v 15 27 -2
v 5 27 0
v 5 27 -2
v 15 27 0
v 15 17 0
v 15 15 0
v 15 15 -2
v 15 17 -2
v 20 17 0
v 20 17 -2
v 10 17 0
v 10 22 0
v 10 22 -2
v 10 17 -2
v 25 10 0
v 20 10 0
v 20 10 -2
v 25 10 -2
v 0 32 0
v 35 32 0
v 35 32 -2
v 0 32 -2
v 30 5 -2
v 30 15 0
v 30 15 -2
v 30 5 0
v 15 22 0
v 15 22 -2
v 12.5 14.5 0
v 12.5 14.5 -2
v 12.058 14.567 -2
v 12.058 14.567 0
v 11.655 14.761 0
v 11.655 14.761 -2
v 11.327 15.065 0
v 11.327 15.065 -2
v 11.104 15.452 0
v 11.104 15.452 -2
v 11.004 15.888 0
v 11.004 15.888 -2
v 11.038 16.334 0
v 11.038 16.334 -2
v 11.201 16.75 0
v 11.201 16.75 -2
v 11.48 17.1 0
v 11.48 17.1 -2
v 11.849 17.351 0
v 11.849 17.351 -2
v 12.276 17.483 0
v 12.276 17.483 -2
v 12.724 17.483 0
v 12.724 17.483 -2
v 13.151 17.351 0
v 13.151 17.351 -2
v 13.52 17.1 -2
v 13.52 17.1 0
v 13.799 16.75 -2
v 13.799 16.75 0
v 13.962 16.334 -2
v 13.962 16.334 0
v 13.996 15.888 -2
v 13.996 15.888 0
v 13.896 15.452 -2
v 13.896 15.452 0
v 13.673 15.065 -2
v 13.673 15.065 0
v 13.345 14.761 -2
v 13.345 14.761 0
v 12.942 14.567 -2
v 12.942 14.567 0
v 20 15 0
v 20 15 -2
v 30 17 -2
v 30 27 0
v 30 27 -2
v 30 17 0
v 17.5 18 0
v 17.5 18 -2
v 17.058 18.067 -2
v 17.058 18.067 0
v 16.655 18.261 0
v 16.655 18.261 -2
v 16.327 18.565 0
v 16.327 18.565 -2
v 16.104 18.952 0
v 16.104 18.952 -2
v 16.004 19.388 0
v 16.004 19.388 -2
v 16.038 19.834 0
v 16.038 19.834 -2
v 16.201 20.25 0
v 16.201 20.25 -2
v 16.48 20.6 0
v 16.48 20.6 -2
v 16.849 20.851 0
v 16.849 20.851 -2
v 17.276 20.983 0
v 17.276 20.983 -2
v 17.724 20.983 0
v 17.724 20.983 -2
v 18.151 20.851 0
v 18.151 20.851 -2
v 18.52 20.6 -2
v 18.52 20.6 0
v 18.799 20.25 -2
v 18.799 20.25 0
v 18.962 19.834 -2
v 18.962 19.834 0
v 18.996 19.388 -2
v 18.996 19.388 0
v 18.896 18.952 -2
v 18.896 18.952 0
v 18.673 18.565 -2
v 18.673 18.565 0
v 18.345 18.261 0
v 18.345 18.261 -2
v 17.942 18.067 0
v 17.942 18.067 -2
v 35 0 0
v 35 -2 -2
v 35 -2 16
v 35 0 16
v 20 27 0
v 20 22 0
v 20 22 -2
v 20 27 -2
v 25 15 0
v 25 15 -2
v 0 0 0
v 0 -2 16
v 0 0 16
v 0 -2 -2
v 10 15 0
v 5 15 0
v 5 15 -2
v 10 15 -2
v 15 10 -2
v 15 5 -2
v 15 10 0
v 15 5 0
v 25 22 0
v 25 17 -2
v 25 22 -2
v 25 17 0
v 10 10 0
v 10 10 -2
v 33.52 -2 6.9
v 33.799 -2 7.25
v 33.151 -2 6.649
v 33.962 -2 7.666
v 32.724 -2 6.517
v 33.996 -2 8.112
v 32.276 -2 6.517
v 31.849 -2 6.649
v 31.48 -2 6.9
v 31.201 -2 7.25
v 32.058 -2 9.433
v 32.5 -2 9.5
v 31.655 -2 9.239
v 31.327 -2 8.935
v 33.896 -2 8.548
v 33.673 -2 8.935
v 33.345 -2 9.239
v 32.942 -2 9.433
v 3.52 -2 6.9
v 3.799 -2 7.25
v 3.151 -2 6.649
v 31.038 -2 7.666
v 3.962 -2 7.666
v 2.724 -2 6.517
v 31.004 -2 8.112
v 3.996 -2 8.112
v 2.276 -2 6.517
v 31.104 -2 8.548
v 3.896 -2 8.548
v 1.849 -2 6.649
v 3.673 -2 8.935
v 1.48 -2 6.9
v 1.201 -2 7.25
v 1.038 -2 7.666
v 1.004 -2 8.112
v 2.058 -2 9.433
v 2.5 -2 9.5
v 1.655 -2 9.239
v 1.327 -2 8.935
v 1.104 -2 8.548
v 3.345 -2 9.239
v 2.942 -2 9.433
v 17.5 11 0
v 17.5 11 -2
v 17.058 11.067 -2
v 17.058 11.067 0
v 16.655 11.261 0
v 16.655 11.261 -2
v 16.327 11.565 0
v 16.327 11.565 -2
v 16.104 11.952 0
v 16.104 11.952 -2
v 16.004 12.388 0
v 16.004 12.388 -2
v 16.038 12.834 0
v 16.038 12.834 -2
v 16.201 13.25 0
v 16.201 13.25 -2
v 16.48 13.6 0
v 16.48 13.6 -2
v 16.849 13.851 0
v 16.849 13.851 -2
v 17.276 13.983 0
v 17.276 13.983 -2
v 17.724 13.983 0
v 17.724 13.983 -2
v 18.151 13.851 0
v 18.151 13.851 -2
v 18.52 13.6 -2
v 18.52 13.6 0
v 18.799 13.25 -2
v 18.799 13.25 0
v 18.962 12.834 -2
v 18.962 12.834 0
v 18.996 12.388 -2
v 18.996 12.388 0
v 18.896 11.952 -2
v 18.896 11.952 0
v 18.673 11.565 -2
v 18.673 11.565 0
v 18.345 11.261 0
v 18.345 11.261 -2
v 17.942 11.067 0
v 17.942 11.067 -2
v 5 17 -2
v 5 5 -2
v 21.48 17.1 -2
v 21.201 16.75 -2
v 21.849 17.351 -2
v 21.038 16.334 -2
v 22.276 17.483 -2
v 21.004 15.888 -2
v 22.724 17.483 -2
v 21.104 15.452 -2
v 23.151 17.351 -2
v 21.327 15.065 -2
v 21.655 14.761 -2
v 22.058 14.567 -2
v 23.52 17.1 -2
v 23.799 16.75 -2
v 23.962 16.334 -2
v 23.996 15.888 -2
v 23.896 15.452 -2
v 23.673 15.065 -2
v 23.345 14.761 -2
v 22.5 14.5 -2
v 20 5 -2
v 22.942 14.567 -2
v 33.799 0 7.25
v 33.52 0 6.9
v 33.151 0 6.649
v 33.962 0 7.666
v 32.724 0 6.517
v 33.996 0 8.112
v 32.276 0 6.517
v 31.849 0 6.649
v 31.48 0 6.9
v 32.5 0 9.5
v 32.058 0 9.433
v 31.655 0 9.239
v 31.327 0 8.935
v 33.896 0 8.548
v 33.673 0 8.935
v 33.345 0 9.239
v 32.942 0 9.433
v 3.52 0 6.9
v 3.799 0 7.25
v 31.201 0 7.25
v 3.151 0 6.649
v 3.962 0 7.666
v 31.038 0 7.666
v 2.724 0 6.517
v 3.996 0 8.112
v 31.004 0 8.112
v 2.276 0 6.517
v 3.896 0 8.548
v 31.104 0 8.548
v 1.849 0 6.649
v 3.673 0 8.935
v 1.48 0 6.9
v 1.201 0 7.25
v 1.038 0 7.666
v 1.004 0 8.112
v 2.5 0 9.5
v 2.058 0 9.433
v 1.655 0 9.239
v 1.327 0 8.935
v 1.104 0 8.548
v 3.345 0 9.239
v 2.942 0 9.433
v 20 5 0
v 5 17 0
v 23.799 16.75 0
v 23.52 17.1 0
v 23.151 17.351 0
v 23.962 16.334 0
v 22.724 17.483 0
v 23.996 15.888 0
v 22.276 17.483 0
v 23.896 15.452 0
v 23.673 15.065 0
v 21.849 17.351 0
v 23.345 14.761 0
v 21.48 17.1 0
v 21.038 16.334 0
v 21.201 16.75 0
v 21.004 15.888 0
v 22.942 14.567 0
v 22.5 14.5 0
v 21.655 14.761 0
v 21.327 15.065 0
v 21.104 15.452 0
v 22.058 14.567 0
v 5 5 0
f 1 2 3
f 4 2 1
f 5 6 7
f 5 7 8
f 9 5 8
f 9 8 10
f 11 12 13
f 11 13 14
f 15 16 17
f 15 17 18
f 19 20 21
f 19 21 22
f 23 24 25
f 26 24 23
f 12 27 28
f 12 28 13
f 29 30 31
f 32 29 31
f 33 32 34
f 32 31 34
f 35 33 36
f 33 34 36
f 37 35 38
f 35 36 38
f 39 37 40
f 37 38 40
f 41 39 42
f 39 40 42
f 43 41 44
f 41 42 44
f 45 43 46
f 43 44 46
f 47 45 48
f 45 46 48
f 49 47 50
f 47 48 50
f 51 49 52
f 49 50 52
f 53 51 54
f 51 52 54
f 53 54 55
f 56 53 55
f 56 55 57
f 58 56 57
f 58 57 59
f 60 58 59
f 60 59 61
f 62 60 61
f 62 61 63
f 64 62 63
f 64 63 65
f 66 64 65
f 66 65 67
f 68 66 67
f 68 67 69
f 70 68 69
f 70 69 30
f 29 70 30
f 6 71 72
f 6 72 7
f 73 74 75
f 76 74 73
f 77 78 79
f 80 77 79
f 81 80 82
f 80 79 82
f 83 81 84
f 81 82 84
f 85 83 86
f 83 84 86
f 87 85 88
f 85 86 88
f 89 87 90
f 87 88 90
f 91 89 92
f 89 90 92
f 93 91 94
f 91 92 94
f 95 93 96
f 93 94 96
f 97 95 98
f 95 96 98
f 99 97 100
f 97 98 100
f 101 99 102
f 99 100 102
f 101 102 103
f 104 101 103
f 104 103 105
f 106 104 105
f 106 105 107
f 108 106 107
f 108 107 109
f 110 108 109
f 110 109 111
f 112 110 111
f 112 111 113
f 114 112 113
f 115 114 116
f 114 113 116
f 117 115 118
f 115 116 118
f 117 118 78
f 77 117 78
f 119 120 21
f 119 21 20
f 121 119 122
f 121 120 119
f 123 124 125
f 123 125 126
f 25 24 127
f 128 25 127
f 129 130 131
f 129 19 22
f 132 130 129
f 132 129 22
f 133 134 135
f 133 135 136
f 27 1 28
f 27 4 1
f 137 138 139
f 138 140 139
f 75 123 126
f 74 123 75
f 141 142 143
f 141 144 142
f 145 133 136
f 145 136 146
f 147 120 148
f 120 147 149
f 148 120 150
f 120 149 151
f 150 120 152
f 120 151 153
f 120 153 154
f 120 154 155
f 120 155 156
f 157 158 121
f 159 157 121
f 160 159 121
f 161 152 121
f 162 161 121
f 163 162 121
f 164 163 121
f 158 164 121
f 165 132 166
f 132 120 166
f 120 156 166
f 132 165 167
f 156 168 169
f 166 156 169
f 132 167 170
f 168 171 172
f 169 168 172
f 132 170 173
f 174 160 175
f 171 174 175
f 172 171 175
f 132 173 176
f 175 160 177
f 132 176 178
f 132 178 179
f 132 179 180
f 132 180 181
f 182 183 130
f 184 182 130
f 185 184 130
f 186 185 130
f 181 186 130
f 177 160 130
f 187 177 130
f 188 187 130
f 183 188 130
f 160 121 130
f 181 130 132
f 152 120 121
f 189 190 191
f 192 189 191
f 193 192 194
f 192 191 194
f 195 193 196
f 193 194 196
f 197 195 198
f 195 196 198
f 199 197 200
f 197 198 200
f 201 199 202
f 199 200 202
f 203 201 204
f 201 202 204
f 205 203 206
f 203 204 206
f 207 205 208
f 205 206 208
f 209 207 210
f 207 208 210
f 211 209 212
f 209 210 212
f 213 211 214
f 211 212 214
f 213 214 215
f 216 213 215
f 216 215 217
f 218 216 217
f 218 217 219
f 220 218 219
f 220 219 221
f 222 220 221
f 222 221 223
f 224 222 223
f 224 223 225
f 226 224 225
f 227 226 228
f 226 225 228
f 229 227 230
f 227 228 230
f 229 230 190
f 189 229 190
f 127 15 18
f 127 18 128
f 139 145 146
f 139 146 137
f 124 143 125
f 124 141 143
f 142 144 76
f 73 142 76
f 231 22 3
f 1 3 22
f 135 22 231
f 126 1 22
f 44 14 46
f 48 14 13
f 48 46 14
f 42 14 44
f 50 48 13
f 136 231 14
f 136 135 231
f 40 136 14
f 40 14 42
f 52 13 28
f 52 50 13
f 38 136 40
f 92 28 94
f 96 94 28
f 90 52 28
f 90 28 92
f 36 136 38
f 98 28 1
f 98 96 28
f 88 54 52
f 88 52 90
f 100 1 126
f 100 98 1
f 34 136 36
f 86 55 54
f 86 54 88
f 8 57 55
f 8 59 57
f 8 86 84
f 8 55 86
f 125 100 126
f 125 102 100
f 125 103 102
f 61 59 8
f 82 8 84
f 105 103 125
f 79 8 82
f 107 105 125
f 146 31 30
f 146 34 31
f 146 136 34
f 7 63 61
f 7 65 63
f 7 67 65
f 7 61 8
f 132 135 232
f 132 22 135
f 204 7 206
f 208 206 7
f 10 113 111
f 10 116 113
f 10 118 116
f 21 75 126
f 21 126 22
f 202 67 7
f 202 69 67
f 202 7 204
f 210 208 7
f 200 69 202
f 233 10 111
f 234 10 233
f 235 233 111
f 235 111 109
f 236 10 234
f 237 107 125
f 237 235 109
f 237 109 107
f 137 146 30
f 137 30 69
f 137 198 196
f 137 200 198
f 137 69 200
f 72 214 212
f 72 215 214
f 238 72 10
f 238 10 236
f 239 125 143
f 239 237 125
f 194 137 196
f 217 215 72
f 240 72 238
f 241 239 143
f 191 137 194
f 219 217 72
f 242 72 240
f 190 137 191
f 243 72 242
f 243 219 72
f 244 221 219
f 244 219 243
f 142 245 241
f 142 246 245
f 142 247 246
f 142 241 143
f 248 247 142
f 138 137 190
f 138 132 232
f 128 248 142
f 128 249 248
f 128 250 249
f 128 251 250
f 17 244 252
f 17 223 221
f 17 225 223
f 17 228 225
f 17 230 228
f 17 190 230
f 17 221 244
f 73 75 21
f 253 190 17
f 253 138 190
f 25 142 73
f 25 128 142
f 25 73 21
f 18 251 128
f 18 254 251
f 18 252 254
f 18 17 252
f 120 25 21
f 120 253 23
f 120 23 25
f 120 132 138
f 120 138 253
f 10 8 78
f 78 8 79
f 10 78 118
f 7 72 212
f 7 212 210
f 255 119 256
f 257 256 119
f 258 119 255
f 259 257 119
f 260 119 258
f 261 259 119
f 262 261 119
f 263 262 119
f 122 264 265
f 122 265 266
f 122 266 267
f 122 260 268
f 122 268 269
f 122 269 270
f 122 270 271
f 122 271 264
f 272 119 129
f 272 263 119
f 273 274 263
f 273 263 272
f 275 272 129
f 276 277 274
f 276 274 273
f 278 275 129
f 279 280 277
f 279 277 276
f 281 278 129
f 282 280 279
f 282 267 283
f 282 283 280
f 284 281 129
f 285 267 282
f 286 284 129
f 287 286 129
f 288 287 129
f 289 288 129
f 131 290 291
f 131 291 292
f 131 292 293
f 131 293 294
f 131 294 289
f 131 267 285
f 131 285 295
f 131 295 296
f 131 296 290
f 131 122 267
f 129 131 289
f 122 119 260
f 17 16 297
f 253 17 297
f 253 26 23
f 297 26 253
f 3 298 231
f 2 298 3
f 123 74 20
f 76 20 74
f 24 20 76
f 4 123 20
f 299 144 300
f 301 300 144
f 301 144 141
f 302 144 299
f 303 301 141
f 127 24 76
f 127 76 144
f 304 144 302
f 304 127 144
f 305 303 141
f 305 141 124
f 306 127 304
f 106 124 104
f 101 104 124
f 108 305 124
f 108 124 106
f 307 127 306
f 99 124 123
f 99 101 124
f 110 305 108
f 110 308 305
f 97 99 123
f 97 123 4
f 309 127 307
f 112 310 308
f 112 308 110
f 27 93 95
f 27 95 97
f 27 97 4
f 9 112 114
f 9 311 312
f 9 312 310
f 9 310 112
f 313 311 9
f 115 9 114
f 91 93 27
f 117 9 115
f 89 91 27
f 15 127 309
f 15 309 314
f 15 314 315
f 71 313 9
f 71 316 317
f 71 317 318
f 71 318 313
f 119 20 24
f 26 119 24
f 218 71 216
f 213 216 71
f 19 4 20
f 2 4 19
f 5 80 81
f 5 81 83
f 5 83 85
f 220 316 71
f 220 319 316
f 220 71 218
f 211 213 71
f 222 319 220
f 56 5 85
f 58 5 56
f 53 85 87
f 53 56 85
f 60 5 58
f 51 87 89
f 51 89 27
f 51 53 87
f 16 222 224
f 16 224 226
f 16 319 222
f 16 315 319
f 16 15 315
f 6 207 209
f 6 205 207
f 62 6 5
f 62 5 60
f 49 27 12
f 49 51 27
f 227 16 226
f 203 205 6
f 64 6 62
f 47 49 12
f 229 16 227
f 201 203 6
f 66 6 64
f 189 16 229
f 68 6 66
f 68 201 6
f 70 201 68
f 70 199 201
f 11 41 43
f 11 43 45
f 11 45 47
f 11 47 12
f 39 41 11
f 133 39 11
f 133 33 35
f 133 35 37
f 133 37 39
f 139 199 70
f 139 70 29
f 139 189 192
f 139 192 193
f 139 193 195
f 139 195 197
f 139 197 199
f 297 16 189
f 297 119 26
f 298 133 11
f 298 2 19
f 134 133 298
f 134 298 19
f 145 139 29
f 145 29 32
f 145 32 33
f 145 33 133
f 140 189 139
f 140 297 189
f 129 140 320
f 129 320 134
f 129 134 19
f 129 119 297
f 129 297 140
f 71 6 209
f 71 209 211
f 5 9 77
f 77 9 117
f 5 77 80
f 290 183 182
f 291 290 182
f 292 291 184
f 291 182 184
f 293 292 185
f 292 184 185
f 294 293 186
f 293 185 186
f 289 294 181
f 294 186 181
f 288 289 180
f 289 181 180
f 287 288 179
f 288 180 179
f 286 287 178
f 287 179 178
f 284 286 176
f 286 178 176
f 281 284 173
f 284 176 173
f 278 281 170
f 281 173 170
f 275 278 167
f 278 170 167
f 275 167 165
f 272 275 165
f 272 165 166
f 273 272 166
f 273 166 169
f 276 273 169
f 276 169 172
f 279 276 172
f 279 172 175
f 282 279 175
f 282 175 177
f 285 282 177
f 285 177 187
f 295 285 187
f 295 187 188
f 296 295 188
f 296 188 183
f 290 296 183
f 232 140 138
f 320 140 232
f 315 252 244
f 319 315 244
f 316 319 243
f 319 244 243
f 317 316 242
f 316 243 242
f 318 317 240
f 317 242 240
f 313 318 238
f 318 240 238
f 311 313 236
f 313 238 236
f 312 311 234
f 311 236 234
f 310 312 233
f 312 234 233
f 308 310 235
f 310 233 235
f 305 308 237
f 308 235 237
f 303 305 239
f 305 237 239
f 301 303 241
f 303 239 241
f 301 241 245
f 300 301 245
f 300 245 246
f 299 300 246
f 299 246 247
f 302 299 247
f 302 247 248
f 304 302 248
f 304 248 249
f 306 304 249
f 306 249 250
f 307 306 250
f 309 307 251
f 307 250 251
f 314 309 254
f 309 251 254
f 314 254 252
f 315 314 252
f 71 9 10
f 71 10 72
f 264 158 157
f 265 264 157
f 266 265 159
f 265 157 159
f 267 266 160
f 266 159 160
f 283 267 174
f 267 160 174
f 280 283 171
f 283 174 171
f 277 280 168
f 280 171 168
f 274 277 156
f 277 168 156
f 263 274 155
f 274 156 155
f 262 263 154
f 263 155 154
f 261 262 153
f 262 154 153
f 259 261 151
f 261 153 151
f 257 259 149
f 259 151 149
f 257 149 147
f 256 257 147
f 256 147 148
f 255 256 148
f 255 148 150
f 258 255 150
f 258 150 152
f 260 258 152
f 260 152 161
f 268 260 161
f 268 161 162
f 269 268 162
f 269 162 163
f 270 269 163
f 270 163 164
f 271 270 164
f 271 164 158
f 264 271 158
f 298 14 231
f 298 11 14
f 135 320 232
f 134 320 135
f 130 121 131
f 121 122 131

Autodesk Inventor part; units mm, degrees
ref_plane "YZ Plane" through (0, 0, 0) normal (1, 0, 0) x (0, 1, 0)
ref_plane "XZ Plane" through (0, 0, 0) normal (0, 1, 0) x (-1, 0, 0)
ref_plane "XY Plane" through (0, 0, 0) normal (0, 0, 1) x (1, 0, 0)
sketch "Sketch1" plane through (0, 0, 0) normal (0, 1, 0) x (-1, 0, 0)
  line L0 (-30, 12) -> (-34, 12)
  line L1 (-34, 12) -> (-34, 14)
  line L2 (-34, 14) -> (-30, 14)
  line L3 (-30, 14) -> (-30, 16)
  line L4 (-30, 16) -> (-35, 16)
  line L5 (-35, 16) -> (-35, 0)
  line L6 (-35, 0) -> (-30, 0)
  line L7 (-30, 0) -> (-30, 12)
  line L8 (-1, 12) -> (-5, 12)
  line L9 (-5, 12) -> (-5, 0)
  line L10 (-5, 0) -> (0, 0)
  line L11 (0, 0) -> (0, 16)
  line L12 (0, 16) -> (-5, 16)
  line L13 (-5, 16) -> (-5, 14)
  line L14 (-5, 14) -> (-1, 14)
  line L15 (-1, 14) -> (-1, 12)
  line L16 (-35, 0) -> (0, 0)
  line L17 (0, 0) -> (0, -2)
  line L18 (0, -2) -> (-35, -2)
  line L19 (-35, -2) -> (-35, 0)
  line L20 (-35, 16) -> (0, 16)
  line L21 (0, 16) -> (0, -2)
  line L22 (0, -2) -> (-35, -2)
  line L23 (-35, -2) -> (-35, 16)
  line L24 (-35, 16) -> (-30, 0)
  line L25 (-5, 0) -> (0, 16)
  point P0 (-32.5, 8)
  point P1 (-2.5, 8)
  dimension "d0" = 2
extrude "Extrusion1" add sketch "Sketch1" along normal blind 32 contours L16 L10 L17 L18 L19 L6
extrude "Extrusion2" add sketch "Sketch1" against normal blind 2
hole "Hole1" at (32.5, 0, 8) at (2.5, 0, 8) direction (0, -1, 0) diameter 3 depth 8 tip angle 118
sketch "Sketch2" plane through (0, 32, 0) normal (0, 0, 1) x (1, 0, 0)
  line L0 (0, -32) -> (35, -32) projected
  line L1 (35, -32) -> (35, 0) projected
  line L2 (0, 0) -> (35, 0) projected
  line L3 (0, -32) -> (0, 0) projected
  line L4 (30, -5) -> (30, -27)
  line L5 (30, -27) -> (5, -27)
  line L6 (5, -27) -> (5, -5)
  line L7 (5, -5) -> (30, -5)
  line L8 (25, -22) -> (25, -10)
  line L9 (25, -10) -> (10, -10)
  line L10 (10, -10) -> (10, -22)
  line L11 (10, -22) -> (25, -22)
  line L12 (20, -15) -> (20, -17)
  line L13 (20, -17) -> (15, -17)
  line L14 (15, -17) -> (15, -15)
  line L15 (15, -15) -> (20, -15)
  point P0 (17.5, -5)
  point P1 (17.5, -10)
  point P2 (17.5, -27)
  point P3 (17.5, -22)
  point P4 (17.5, -15)
  point P5 (17.5, -17)
  dimension "d12" = 5
  dimension "d13" = 5
  dimension "d14" = 5
extrude "Extrusion3" cut sketch "Sketch2" against normal blind 10 contours L4 L5 L6 L7 | L12 L13 L14 L15
sketch "Sketch3" plane through (0, 32, 0) normal (0, 0, 1) x (1, 0, 0)
  line L0 (15, -17) -> (15, -15) projected
  line L1 (20, -15) -> (20, -17) projected
  line L2 (20, -17) -> (15, -17) projected
  line L3 (15, -15) -> (20, -15) projected
  line L4 (15, -17) -> (20, -17)
  line L5 (20, -17) -> (20, -28.4521)
  line L6 (20, -28.4521) -> (15, -28.4521)
  line L7 (15, -28.4521) -> (15, -17)
  line L8 (15, -15) -> (5, -15)
  line L9 (5, -15) -> (5, -17)
  line L10 (5, -17) -> (15, -17)
  line L11 (15, -17) -> (15, -15)
  line L12 (15, -15) -> (20, -15)
  line L13 (20, -15) -> (20, -5)
  line L14 (20, -5) -> (15, -5)
  line L15 (15, -5) -> (15, -15)
  line L16 (20, -15) -> (30, -15)
  line L17 (30, -15) -> (30, -17)
  line L18 (30, -17) -> (20, -17)
  line L19 (20, -17) -> (20, -15)
  line L20 (20, -10) -> (15, -15)
  line L21 (10, -15) -> (15, -17)
  line L22 (15, -17) -> (20, -22)
  line L23 (25, -15) -> (20, -17)
  point P0 (0, -32)
  point P1 (22.5, -16)
  point P2 (17.5, -12.5)
  point P3 (12.5, -16)
  point P4 (17.5, -19.5)
extrude "Extrusion4" add sketch "Sketch3" against normal up to surface (2 mm away) contours L22 L5 L6 L7 | L10 L9 L8 L21 | L2 L5 L22 | L15 L14 L13 L20 | L23 L16 L17 L18
hole "Hole2" at (22.5, 16, 0) at (17.5, 19.5, 0) at (12.5, 16, 0) at (17.5, 12.5, 0) direction (0, 0, -1) diameter 3 depth 8 tip angle 118
properties part number "slide_sensor_base"
